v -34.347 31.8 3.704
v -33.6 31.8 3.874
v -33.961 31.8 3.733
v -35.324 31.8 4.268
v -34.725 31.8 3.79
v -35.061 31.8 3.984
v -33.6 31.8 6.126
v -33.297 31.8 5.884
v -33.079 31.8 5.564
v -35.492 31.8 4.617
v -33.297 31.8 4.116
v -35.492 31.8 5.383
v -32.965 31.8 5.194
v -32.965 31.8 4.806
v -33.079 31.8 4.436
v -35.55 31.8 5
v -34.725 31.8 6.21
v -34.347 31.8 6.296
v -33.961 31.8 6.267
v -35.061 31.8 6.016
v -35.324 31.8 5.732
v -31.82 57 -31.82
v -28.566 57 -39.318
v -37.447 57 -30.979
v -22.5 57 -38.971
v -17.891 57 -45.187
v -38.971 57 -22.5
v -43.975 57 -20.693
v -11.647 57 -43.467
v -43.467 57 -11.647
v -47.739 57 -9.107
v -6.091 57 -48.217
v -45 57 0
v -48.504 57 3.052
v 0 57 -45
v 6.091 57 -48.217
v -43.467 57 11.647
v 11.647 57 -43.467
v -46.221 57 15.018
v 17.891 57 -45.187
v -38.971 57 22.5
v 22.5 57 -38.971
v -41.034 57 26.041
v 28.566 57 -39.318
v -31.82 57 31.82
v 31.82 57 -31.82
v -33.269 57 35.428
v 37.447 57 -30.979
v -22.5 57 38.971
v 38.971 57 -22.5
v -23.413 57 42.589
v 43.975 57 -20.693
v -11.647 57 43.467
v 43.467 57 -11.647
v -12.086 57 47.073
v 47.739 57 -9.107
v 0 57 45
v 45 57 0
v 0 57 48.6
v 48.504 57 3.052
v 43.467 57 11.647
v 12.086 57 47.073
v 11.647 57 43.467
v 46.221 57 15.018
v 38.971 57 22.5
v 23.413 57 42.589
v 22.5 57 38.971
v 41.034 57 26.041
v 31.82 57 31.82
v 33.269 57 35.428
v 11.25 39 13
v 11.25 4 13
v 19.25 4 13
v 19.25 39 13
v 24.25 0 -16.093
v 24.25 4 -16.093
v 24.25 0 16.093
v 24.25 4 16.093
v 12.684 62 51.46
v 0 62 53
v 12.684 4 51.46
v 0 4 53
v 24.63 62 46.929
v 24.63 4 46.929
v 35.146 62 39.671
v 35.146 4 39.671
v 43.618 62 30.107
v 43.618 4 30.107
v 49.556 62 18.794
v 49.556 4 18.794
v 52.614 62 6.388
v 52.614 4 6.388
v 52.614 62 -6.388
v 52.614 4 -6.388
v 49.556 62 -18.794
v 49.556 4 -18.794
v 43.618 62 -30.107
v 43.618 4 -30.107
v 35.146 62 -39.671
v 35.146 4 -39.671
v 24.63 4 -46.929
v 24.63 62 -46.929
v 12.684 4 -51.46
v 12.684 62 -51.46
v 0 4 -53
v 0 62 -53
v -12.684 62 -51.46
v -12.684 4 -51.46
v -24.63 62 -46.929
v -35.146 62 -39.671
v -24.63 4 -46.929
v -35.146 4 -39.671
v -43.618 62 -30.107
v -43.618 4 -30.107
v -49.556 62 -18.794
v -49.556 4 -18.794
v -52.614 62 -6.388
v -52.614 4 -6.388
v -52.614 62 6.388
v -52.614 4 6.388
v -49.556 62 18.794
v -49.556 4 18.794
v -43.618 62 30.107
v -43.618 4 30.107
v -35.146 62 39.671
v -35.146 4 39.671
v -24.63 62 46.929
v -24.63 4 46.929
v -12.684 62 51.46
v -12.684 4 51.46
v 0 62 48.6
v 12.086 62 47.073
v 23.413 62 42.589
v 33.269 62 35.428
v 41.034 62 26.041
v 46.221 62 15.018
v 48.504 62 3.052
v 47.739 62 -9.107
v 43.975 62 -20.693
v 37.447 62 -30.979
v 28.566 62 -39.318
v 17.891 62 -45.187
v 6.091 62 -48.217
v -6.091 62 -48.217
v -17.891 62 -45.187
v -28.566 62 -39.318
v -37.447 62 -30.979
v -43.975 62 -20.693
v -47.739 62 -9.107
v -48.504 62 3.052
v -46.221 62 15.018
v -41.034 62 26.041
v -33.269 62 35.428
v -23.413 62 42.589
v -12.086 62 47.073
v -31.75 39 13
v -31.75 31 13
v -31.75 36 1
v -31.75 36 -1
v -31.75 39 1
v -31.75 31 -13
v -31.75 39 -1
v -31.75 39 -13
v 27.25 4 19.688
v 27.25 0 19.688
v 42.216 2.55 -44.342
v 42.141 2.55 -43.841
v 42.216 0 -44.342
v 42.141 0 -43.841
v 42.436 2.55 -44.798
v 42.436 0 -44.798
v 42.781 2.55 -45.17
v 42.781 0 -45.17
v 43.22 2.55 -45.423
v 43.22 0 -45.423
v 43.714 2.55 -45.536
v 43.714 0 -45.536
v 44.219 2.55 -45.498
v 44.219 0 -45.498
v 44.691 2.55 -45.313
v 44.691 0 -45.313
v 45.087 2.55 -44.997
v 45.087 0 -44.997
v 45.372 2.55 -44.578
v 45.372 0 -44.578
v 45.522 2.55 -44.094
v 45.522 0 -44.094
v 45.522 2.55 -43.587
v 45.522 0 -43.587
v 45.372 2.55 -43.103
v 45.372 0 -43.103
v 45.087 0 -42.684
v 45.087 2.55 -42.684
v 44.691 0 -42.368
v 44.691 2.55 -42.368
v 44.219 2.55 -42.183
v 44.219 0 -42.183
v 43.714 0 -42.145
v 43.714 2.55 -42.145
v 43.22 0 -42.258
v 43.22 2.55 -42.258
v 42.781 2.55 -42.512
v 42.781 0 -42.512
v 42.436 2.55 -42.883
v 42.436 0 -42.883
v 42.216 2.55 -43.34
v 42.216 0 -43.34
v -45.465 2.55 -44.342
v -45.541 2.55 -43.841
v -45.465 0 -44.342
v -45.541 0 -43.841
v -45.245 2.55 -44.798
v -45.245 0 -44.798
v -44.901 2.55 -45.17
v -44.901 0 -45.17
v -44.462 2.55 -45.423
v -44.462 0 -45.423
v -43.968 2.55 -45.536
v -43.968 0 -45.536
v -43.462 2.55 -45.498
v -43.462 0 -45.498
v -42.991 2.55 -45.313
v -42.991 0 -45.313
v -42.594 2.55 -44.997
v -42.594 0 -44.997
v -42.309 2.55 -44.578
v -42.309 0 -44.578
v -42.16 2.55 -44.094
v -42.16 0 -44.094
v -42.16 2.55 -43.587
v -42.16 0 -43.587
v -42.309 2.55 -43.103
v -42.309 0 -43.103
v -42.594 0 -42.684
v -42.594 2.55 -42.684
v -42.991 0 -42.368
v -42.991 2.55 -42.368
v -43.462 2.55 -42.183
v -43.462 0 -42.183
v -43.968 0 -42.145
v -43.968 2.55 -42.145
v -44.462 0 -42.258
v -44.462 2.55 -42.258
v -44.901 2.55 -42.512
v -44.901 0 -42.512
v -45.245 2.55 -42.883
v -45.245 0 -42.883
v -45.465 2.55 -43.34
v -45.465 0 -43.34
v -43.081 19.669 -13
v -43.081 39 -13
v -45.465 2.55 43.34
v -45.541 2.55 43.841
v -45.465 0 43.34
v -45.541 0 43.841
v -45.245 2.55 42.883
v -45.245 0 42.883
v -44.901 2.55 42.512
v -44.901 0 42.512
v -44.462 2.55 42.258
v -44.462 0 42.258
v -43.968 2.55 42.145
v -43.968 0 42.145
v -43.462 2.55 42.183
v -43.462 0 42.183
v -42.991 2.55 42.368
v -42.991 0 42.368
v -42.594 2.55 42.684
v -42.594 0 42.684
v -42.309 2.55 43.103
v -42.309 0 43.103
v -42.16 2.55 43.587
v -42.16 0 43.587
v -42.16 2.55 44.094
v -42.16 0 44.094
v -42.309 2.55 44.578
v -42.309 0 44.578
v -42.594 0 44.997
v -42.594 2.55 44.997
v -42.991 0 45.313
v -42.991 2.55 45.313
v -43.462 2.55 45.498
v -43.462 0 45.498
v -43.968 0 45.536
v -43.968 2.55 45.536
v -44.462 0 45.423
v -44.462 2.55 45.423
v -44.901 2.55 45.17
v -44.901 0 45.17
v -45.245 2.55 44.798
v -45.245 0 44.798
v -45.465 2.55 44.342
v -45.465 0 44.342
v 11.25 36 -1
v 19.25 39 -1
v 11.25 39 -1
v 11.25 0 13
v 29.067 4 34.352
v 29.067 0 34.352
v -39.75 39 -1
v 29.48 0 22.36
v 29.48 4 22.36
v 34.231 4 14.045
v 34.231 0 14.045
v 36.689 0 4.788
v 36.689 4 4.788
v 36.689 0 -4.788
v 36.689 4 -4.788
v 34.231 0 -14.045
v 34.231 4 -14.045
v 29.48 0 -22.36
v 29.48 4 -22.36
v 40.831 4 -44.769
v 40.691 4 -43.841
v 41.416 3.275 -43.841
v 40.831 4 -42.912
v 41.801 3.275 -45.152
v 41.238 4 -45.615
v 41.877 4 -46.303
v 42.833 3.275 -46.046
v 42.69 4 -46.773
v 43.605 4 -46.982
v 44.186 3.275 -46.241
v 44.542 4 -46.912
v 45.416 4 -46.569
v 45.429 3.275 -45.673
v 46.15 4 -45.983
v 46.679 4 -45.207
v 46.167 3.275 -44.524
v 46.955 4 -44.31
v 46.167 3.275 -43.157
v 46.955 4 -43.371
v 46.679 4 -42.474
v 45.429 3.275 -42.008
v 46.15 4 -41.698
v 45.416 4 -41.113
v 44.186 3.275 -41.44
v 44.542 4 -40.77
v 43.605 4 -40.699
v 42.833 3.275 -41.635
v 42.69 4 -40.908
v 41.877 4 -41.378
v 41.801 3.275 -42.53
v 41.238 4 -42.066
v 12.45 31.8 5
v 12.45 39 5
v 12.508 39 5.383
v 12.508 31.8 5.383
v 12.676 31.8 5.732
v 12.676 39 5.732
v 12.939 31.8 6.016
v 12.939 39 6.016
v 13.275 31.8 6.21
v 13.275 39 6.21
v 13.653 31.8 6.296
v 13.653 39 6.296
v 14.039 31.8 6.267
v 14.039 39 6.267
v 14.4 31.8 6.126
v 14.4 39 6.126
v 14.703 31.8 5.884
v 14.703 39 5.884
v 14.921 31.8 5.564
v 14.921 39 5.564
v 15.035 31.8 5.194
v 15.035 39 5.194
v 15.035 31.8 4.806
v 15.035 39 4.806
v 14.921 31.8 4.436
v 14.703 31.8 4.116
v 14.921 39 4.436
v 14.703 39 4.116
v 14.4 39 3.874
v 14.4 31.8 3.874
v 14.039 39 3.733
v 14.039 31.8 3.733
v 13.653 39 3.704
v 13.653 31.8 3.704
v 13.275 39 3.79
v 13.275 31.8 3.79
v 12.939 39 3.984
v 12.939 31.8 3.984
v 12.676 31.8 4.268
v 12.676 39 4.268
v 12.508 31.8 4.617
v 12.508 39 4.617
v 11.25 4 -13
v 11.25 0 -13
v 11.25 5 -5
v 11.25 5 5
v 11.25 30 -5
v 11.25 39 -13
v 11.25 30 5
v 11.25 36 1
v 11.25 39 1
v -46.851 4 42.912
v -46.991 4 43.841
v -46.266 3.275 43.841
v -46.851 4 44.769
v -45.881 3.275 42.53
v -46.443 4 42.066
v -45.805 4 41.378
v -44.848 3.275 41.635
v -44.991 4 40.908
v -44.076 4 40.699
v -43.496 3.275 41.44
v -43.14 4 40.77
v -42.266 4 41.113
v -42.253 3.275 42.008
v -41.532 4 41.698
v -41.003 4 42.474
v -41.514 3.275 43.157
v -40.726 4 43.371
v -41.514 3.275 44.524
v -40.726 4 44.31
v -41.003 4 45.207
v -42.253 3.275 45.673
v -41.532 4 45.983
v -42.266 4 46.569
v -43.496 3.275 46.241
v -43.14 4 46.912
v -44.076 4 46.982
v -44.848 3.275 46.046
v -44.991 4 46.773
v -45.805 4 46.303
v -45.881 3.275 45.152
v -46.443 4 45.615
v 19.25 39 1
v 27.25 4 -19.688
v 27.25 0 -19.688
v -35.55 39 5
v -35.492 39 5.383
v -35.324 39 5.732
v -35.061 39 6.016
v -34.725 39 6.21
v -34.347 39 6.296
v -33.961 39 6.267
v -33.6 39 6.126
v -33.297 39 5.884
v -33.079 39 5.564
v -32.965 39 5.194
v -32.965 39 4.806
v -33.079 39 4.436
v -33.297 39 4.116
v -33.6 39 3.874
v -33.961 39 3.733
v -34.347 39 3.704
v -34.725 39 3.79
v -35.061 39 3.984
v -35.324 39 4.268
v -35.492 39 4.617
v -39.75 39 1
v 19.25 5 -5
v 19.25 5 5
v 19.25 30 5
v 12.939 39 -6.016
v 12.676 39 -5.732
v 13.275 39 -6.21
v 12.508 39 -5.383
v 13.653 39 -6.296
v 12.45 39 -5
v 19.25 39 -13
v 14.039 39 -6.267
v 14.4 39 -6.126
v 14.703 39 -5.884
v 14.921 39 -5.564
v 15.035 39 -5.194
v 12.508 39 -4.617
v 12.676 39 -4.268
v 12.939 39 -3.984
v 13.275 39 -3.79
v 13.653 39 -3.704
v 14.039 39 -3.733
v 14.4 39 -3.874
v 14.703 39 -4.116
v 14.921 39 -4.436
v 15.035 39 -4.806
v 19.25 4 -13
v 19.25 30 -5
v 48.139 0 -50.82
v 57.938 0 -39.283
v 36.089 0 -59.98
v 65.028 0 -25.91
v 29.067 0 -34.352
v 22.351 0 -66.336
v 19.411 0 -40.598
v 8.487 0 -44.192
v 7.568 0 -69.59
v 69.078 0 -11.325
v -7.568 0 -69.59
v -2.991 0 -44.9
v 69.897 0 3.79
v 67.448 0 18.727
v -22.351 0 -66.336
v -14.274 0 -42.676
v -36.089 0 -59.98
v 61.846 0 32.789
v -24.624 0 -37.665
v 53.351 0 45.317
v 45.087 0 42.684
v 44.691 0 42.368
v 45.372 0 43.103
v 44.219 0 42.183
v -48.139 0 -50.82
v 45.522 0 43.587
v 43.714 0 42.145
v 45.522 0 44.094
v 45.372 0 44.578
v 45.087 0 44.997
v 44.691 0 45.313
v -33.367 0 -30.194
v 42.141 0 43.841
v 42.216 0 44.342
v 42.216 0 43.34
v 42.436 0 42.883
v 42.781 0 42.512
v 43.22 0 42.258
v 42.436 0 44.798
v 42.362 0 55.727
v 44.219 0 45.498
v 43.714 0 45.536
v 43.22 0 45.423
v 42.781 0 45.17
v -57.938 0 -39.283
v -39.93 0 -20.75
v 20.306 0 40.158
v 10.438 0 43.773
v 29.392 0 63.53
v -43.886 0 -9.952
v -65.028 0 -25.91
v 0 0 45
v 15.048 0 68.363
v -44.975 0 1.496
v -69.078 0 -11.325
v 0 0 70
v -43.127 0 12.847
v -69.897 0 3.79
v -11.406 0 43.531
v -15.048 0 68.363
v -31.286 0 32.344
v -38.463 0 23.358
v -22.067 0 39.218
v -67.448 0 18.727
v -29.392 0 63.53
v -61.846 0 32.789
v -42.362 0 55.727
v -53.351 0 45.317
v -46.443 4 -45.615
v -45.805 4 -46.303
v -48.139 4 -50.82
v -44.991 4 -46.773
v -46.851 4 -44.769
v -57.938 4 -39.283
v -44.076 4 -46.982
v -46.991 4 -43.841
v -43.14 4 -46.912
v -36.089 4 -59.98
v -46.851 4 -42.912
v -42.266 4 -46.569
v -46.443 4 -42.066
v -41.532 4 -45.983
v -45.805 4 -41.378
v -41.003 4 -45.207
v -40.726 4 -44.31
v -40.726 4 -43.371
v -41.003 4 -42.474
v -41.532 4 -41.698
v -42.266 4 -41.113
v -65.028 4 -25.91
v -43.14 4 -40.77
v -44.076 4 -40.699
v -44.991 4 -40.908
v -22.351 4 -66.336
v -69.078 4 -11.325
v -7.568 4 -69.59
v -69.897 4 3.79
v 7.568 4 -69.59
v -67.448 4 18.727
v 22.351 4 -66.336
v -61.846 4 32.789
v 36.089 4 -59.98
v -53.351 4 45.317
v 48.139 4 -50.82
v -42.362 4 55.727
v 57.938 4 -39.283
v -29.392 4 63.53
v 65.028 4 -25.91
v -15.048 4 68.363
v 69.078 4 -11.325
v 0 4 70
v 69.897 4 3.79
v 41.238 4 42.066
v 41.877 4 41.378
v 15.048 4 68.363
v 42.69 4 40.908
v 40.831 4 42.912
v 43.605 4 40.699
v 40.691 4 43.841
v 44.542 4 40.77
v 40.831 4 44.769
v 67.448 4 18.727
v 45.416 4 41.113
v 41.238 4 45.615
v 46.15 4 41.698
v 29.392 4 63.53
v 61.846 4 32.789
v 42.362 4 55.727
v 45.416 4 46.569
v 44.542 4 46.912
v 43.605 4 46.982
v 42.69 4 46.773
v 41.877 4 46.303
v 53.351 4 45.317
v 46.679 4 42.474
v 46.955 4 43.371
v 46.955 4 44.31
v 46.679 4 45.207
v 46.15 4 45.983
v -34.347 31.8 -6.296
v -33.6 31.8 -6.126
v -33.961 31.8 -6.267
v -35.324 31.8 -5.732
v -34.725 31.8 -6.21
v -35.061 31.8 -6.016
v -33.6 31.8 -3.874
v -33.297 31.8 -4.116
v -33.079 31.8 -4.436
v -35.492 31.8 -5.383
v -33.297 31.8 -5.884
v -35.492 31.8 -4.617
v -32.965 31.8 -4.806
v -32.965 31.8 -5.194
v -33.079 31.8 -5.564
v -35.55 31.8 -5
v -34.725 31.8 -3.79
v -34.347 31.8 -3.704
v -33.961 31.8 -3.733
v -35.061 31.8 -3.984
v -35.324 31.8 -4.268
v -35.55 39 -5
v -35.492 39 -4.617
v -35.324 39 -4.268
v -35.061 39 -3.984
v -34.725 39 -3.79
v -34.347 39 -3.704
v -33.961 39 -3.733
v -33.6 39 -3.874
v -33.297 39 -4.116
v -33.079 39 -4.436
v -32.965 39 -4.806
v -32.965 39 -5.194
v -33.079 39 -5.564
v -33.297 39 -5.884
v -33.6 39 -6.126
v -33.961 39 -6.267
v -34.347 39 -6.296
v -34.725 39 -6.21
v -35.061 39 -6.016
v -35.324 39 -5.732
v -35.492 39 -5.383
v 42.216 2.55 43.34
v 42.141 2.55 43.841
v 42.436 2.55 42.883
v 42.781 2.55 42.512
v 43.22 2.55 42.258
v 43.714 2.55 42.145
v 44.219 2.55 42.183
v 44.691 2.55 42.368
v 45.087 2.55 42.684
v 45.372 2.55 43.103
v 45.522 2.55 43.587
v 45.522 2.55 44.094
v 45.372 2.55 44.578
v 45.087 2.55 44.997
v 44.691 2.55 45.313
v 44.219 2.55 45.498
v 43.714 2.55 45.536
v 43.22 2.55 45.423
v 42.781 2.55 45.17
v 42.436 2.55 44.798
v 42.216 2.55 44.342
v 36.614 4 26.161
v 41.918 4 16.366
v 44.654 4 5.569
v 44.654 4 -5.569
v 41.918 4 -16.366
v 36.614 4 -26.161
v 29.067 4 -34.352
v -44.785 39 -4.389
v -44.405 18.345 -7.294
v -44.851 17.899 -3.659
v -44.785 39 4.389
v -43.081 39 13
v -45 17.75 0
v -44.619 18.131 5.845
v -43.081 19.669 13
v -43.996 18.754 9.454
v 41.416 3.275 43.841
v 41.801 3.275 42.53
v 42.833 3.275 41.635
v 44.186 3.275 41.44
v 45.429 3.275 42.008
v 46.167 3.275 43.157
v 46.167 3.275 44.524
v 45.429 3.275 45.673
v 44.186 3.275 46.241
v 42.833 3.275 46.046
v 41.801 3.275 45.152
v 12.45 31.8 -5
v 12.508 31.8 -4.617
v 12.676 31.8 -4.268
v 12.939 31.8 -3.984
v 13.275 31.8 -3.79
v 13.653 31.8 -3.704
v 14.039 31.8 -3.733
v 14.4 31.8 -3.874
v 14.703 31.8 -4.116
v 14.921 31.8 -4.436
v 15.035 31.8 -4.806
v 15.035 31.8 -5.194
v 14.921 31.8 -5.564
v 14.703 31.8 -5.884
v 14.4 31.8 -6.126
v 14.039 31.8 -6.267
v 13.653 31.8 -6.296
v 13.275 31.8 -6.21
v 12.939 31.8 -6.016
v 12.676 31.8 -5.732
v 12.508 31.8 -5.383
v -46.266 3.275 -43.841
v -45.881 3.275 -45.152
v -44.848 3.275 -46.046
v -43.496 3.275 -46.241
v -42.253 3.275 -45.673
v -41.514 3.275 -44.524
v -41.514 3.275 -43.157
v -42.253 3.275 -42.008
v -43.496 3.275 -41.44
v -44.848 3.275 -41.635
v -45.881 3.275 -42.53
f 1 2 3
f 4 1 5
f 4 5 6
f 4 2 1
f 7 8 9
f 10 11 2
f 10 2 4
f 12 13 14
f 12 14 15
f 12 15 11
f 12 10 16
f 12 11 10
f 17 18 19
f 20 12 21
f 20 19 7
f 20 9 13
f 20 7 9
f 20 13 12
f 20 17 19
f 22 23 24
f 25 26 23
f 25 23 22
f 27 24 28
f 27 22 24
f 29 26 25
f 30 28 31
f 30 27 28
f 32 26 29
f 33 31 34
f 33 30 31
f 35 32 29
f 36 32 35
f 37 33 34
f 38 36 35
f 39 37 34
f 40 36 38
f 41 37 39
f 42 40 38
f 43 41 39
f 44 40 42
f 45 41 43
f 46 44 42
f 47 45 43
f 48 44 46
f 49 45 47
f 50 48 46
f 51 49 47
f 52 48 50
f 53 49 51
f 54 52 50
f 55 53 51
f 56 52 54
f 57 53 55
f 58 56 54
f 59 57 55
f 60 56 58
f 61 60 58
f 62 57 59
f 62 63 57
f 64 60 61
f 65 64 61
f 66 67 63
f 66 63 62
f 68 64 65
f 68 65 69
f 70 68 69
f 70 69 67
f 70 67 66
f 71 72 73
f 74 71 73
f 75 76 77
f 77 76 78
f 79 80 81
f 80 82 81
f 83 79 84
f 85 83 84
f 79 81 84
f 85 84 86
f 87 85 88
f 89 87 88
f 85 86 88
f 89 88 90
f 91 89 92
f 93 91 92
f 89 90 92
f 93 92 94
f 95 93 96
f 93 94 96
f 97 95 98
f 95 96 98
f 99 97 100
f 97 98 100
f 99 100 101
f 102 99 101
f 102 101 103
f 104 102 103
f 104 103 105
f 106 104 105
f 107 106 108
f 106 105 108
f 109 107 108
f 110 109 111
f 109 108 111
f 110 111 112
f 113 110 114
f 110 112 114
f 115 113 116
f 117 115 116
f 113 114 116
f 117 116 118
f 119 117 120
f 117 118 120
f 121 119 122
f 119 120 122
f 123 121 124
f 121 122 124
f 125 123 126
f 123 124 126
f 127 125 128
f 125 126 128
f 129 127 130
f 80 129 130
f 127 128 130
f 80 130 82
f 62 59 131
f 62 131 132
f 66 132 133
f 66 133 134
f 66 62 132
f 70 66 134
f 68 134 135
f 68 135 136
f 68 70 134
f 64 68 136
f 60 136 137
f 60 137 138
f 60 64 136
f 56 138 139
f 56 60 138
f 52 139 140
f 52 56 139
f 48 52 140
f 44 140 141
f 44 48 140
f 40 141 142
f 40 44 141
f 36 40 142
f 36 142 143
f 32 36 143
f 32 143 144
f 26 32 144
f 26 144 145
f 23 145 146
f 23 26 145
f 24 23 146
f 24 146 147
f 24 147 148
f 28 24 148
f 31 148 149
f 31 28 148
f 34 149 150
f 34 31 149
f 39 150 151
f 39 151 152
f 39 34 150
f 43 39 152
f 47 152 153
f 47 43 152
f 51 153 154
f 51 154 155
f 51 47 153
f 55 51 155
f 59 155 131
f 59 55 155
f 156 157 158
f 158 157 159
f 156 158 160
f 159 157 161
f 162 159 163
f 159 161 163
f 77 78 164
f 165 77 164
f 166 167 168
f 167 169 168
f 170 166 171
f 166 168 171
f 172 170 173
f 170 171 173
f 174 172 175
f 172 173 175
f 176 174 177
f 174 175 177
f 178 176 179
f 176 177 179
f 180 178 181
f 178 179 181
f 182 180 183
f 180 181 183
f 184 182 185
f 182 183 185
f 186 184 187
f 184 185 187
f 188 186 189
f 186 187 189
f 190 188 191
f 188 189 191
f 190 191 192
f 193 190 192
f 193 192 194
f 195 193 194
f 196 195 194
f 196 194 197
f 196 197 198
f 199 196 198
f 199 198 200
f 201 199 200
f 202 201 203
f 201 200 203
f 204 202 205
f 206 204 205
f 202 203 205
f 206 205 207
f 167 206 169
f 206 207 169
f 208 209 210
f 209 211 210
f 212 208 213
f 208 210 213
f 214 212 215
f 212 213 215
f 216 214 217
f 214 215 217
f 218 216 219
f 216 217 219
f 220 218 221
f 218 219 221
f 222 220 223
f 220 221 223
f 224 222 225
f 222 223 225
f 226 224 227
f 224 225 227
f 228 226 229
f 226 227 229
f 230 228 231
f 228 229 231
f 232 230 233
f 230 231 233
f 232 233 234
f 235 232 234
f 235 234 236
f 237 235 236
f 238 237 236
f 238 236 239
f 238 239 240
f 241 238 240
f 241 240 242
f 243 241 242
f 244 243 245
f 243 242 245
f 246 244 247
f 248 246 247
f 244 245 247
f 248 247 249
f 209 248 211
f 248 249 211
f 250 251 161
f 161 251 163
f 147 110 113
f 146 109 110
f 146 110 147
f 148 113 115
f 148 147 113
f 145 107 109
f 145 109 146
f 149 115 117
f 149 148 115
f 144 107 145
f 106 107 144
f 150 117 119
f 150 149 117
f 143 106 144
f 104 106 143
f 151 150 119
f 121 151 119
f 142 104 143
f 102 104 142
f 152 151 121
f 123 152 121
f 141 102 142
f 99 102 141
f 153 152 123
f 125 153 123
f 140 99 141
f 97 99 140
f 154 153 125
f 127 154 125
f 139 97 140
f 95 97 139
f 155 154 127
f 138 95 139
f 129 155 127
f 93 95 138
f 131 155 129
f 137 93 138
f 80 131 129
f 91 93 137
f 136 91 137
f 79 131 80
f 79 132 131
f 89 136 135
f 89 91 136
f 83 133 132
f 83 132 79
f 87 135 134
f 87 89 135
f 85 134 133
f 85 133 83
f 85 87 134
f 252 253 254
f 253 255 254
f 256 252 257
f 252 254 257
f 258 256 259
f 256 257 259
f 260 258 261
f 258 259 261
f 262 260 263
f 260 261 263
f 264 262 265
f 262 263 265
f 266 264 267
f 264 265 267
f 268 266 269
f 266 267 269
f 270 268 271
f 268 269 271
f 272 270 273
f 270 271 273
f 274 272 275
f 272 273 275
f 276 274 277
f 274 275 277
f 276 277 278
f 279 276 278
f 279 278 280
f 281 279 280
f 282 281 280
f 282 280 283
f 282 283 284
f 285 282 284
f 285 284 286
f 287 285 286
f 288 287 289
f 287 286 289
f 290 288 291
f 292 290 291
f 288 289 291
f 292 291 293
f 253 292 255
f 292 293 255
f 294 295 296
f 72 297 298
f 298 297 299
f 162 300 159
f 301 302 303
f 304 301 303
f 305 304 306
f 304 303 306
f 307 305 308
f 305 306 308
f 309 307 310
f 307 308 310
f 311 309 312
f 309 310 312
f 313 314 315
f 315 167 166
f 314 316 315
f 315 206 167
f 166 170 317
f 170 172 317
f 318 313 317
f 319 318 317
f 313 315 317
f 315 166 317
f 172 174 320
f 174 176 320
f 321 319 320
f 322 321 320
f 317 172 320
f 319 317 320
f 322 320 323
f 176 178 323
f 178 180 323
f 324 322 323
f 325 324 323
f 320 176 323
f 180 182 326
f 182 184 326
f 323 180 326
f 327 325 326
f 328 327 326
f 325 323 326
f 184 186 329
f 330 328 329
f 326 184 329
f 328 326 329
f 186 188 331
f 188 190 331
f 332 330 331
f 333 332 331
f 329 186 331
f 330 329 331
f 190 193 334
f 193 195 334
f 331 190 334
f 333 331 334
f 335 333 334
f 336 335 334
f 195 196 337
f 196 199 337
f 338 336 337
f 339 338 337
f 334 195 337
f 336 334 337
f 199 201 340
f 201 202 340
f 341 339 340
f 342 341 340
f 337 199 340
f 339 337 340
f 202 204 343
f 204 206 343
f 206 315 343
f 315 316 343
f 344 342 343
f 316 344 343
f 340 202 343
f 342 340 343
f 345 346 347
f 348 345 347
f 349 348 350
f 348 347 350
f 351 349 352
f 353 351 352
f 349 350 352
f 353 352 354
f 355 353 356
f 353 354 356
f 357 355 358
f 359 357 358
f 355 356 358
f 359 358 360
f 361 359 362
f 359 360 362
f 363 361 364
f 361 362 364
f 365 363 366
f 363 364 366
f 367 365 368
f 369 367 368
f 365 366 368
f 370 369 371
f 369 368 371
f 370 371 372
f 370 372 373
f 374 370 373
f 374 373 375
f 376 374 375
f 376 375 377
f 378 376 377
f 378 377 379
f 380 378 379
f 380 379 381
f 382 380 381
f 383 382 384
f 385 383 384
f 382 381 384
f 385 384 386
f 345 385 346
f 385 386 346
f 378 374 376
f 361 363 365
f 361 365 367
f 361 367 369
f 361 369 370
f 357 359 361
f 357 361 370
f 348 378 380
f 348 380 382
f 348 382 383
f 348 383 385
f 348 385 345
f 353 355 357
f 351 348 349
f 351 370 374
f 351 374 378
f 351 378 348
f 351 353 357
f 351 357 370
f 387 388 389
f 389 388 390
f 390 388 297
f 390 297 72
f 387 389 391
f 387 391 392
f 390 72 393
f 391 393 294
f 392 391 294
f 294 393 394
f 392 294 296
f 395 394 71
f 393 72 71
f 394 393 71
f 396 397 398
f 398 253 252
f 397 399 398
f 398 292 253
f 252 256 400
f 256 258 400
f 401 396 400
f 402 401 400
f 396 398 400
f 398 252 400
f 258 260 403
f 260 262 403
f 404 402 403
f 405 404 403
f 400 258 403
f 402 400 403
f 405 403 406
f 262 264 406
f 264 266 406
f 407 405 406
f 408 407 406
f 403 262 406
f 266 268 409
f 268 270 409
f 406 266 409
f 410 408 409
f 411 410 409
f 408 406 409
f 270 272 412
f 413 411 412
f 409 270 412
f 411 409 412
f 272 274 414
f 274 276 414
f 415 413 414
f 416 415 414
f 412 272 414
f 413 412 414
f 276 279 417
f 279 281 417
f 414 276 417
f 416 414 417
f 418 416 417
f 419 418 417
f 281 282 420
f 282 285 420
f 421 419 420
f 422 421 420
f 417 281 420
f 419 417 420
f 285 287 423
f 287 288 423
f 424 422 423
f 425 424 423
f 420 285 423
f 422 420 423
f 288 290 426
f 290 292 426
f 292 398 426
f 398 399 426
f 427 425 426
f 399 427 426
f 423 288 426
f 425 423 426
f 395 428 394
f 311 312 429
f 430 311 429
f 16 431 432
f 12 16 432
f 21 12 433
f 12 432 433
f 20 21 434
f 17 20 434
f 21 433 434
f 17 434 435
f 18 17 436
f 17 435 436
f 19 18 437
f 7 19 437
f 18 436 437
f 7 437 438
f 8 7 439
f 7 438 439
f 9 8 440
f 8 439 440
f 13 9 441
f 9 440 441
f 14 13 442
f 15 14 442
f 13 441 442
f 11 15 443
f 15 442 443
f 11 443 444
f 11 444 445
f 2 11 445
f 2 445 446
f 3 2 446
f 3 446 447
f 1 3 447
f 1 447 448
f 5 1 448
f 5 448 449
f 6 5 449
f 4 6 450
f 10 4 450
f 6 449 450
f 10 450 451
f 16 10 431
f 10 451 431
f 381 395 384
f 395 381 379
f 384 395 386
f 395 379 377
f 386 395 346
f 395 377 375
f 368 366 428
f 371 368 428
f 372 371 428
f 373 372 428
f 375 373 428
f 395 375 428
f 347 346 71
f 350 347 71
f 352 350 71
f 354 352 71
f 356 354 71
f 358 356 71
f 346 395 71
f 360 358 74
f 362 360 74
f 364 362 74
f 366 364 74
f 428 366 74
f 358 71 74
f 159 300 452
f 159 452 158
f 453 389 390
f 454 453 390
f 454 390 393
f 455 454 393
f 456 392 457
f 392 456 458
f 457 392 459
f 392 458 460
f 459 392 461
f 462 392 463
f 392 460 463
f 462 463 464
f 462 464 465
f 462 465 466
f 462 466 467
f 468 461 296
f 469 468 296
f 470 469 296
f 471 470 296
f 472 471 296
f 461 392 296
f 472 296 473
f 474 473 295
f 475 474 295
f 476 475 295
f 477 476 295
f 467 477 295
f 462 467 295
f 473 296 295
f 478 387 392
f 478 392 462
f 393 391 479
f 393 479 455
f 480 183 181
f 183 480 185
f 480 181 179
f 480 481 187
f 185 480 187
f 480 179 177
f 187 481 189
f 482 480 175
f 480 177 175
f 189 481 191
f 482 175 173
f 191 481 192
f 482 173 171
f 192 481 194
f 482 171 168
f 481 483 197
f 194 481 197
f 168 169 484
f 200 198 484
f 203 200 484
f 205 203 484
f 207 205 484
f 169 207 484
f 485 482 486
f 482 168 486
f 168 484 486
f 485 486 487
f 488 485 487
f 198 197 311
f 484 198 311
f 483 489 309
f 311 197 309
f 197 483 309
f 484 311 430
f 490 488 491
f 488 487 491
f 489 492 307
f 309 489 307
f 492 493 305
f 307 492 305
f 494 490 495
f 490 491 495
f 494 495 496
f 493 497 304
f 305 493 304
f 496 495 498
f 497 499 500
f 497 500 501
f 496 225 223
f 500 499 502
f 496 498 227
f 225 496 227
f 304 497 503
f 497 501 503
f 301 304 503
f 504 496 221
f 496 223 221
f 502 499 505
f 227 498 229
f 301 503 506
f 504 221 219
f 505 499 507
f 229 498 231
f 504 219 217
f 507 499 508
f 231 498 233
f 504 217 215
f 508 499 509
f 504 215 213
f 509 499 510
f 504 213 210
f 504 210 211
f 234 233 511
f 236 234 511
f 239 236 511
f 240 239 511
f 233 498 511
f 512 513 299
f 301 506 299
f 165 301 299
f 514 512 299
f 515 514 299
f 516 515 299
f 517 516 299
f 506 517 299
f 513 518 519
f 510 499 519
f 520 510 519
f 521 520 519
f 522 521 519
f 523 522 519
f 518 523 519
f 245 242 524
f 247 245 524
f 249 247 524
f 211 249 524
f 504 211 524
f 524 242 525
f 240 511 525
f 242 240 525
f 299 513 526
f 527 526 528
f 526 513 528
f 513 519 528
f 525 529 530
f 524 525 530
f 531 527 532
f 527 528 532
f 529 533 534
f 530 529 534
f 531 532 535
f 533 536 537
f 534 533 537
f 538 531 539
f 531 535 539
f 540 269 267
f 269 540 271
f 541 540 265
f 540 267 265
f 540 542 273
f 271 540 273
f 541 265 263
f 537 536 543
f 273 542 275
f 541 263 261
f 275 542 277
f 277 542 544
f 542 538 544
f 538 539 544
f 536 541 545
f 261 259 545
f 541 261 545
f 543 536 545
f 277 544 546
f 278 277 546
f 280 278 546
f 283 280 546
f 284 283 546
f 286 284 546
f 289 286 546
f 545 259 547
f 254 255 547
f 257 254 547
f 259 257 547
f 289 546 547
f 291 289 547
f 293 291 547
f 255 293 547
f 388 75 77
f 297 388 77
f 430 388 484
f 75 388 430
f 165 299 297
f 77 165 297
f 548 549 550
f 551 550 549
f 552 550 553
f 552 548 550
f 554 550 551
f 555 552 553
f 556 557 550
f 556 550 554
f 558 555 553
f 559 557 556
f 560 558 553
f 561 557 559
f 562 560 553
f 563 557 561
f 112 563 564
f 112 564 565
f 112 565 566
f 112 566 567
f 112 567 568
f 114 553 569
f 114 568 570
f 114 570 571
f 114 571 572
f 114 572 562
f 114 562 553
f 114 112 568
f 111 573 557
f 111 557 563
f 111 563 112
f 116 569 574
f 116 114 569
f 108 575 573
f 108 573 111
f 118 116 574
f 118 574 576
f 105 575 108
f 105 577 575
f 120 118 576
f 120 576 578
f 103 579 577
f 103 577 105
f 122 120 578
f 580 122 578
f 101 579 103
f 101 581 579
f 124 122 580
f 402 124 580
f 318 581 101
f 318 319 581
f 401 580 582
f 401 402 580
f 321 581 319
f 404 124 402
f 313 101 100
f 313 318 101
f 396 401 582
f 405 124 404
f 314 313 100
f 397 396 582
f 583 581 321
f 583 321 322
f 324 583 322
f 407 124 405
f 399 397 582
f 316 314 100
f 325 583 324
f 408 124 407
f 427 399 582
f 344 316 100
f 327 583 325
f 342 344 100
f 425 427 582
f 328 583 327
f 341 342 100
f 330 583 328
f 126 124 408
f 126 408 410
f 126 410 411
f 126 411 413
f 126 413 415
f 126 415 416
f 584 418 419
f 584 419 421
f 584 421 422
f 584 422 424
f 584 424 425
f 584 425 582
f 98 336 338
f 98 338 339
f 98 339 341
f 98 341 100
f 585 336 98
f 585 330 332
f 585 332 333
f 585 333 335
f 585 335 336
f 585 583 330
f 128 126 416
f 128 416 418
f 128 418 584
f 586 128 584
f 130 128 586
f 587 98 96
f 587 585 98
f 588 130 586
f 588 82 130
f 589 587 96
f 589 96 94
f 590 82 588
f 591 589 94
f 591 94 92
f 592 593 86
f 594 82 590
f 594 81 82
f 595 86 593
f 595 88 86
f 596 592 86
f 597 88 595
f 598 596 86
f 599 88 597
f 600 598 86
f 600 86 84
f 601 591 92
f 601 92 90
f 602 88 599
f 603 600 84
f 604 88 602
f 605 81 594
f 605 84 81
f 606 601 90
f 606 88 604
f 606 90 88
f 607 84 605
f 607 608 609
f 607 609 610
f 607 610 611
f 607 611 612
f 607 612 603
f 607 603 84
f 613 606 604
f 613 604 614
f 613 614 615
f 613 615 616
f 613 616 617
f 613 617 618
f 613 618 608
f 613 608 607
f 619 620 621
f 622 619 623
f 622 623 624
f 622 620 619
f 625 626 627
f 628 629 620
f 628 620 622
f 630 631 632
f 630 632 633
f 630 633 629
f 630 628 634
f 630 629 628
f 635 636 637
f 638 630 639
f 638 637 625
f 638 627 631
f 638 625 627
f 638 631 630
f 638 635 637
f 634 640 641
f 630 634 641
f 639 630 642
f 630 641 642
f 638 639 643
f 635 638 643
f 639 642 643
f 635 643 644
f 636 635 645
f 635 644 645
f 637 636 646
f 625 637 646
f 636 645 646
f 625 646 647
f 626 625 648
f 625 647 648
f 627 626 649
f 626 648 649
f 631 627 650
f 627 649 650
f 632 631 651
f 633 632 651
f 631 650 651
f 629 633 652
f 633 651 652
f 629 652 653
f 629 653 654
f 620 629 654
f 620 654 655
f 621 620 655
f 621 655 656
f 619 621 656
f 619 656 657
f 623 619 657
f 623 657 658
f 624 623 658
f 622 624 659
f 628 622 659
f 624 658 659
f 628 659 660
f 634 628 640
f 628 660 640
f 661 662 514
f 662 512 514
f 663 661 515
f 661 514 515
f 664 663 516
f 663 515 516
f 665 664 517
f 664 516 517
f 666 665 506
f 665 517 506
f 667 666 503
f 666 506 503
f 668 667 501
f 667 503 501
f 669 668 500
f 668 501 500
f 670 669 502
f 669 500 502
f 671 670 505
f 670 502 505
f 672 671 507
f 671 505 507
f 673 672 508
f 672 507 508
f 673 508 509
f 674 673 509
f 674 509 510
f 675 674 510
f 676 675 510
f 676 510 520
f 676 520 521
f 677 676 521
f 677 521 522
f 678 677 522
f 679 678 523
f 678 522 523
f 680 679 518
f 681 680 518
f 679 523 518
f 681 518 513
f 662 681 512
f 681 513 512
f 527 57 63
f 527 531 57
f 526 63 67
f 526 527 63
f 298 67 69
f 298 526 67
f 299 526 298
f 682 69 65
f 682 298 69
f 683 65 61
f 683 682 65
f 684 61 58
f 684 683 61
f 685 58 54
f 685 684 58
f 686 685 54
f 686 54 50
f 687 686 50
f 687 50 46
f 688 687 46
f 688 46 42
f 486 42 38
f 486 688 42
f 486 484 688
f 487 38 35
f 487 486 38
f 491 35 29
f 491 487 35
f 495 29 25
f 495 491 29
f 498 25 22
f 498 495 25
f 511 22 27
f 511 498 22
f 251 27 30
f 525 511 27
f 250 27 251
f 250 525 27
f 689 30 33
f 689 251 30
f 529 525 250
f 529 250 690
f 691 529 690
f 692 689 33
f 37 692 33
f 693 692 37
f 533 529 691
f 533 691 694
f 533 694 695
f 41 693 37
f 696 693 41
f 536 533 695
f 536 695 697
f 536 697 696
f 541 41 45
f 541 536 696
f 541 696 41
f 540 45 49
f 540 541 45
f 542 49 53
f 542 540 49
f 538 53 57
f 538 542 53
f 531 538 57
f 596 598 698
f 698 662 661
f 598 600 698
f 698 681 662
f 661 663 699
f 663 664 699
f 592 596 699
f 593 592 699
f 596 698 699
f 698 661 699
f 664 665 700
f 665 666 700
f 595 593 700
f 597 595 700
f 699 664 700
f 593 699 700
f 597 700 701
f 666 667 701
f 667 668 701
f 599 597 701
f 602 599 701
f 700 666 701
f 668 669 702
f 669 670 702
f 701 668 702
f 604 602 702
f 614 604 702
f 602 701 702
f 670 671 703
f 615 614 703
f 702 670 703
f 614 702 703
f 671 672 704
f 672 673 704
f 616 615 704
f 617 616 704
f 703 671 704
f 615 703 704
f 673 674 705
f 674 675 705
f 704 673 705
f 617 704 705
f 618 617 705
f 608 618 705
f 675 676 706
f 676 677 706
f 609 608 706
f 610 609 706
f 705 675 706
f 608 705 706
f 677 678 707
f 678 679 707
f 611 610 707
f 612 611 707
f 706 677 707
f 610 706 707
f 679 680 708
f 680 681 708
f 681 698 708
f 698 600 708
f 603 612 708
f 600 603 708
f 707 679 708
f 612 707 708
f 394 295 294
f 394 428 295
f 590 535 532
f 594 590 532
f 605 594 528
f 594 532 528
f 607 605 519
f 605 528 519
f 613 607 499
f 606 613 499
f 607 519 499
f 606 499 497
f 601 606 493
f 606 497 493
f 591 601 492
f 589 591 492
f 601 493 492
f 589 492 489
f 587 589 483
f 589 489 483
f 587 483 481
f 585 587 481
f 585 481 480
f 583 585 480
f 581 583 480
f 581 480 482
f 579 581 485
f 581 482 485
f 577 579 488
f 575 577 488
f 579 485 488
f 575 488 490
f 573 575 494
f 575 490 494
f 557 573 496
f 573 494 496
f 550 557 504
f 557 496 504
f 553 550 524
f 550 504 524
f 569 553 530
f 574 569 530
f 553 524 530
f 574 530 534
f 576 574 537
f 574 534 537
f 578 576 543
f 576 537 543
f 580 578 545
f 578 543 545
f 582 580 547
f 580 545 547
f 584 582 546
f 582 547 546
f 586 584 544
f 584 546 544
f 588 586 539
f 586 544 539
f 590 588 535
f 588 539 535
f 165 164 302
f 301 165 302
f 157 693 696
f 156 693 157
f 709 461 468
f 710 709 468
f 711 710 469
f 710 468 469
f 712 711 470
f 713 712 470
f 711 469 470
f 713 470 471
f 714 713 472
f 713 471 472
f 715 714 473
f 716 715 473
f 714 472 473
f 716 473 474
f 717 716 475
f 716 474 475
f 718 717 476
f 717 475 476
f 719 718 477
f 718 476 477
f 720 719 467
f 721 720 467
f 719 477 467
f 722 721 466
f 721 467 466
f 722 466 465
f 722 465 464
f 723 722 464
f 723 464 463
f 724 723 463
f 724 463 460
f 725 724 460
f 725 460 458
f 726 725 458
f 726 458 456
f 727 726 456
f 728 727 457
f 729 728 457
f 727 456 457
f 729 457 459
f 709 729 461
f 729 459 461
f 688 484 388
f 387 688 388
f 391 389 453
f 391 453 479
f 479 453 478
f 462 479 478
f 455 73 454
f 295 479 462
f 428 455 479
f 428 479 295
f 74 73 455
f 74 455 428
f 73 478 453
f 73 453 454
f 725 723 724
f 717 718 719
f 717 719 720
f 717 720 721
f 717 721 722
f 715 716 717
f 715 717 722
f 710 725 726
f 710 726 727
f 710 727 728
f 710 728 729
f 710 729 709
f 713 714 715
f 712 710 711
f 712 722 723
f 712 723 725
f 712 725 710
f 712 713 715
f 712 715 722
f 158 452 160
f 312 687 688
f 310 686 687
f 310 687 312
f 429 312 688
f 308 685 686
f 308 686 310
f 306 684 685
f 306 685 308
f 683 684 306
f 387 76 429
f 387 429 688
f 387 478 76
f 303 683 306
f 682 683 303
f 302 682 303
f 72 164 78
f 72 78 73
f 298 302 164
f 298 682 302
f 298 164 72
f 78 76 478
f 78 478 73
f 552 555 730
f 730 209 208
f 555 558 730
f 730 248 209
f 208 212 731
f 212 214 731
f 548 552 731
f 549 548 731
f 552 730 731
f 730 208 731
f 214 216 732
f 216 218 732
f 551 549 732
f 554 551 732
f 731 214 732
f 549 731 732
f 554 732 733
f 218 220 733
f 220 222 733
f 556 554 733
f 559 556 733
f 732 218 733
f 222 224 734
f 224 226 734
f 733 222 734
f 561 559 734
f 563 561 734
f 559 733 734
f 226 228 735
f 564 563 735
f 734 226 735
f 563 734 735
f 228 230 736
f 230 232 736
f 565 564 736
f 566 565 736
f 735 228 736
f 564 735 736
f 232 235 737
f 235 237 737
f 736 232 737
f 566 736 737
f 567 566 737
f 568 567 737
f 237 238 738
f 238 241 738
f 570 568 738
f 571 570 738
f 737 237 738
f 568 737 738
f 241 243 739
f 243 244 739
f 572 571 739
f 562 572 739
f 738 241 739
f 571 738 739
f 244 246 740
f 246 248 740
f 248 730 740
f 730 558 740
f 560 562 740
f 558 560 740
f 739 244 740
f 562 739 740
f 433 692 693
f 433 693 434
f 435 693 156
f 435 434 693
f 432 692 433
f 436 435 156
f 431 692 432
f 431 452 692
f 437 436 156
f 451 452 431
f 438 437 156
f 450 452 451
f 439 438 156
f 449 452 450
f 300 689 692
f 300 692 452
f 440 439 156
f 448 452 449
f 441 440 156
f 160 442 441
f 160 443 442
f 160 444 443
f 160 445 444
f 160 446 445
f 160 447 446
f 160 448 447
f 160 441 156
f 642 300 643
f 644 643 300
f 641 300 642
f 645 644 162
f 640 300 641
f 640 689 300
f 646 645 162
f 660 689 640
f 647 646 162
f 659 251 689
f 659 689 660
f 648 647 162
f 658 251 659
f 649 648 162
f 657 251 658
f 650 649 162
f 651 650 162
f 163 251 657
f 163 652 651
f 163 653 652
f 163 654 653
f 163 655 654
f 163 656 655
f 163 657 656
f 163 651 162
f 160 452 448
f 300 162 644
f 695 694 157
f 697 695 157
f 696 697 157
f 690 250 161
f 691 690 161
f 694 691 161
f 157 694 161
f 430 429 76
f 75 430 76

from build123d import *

# Parameters (mm, degrees)
SKETCH1_R                                           = 70
SKETCH1_R_2                                         = 45
BOSS_EXTRUDE1_DEPTH                                 = 4
SKETCH2_R                                           = 53
SKETCH2_R_2                                         = 45
BOSS_EXTRUDE2_DEPTH                                 = 53
SKETCH4_W                                           = 13.25
SKETCH4_H                                           = 8
SKETCH4_W_2                                         = 8
SKETCH4_H_2                                         = 39
BOSS_EXTRUDE4_DEPTH                                 = 13
BOSS_EXTRUDE5_DEPTH                                 = 4
SKETCH7_R                                           = 1.3
CUT_EXTRUDE4_DEPTH                                  = 7.2
SKETCH9_W                                           = 10
SKETCH9_H                                           = 25
CUT_EXTRUDE7_DEPTH                                  = 8
CUT_EXTRUDE9_DEPTH                                  = 113.289803633
CSK_FOR_M3_COUNTERSUNK_FLAT_HEAD_SCREW1_D           = 3.4
CSK_FOR_M3_COUNTERSUNK_FLAT_HEAD_SCREW1_CSINK_D     = 6.3
CSK_FOR_M3_COUNTERSUNK_FLAT_HEAD_SCREW1_CSINK_ANGLE = 90
SKETCH18_R                                          = 53
SKETCH18_R_2                                        = 48.6
BOSS_EXTRUDE6_DEPTH                                 = 5
CUT_EXTRUDE10_DEPTH                                 = 1


with BuildPart() as part:
    # Sketch1 → Boss-Extrude1 (new body)
    with BuildSketch(Plane(origin=(0, 0, 0), x_dir=(1, 0, 0), z_dir=(0, 1, 0))):
        with Locations(Location((0, 0, 0), (0, 0, 270))):
            Circle(SKETCH1_R)
        with Locations(Location((0, 0, 0), (0, 0, 270))):
            Circle(SKETCH1_R_2, mode=Mode.SUBTRACT)
    extrude(amount=BOSS_EXTRUDE1_DEPTH)

    # Sketch2 → Boss-Extrude2 (add)
    with BuildSketch(Plane(origin=(0, 4, 0), x_dir=(1, 0, 0), z_dir=(0, 1, 0))):
        with Locations(Location((0, 0, 0), (0, 0, 270))):
            Circle(SKETCH2_R)
        with Locations(Location((0, 0, 0), (0, 0, 270))):
            Circle(SKETCH2_R_2, mode=Mode.SUBTRACT)
    extrude(amount=BOSS_EXTRUDE2_DEPTH)

    # Sketch4 → Boss-Extrude4 (add, symmetric)
    with BuildSketch(Plane.XY):
        with Locations((-38.375, 35)):
            Rectangle(SKETCH4_W, SKETCH4_H)
        Polygon((-31.75, 31), (-45, 31), (-45, 17.75), align=None)
        with Locations((15.25, 19.5)):
            Rectangle(SKETCH4_W_2, SKETCH4_H_2)
    extrude(amount=BOSS_EXTRUDE4_DEPTH, both=True)


with BuildPart() as boss_extrude4_piece_1:
    # of the separate pieces the step leaves, piece 1, a body of its own (boss_extrude4_pieces)
    add(part.part.solids().sort_by_distance((0, 0, 70))[0])



with BuildPart() as boss_extrude4_piece_2:
    # of the separate pieces the step leaves, piece 2, a body of its own (boss_extrude4_pieces)
    add(part.part.solids().sort_by_distance((11.25, 39, -13))[0])


with BuildPart() as boss_extrude4_piece_1_1:
    add(boss_extrude4_piece_1.part)

    add(boss_extrude4_piece_2.part)  # Boss-Extrude5 merges Boss-Extrude4 piece 2
    # Sketch5 → Boss-Extrude5 (add)
    with BuildSketch(Plane.XZ):
        with BuildLine():
            Line((11.25, 13), (29.067400866, 34.352382842))
            ThreePointArc((29.067400866, 34.352382842), (45, 0), (29.067400866, -34.352382842))
            Line((29.067400866, -34.352382842), (11.25, -13))
            Line((11.25, -13), (11.25, 13))
        make_face()
    extrude(amount=-BOSS_EXTRUDE5_DEPTH)

    # Sketch7 → Cut-Extrude4 (cut)
    with BuildSketch(Plane(origin=(0, 39, 0), x_dir=(1, 0, 0), z_dir=(0, 1, 0))):
        with Locations(Location((-34.25, 5, 0), (0, 0, 180))):
            Circle(SKETCH7_R)
        with Locations(Location((-34.25, -5, 0), (0, 0, 180))):
            Circle(SKETCH7_R)
        with Locations(Location((13.75, 5, 0), (0, 0, 180))):
            Circle(SKETCH7_R)
        with Locations(Location((13.75, -5, 0), (0, 0, 180))):
            Circle(SKETCH7_R)
    extrude(amount=-CUT_EXTRUDE4_DEPTH, mode=Mode.SUBTRACT)

    # Sketch9 → Cut-Extrude7 (cut)
    with BuildSketch(Plane.ZY.offset(-11.25)):
        with Locations((0, 17.5)):
            Rectangle(SKETCH9_W, SKETCH9_H)
    extrude(amount=-CUT_EXTRUDE7_DEPTH, mode=Mode.SUBTRACT)

    # Sketch12 → Cut-Extrude9 (cut, through all)
    with BuildSketch(Plane(origin=(0, 4, 0), x_dir=(1, 0, 0), z_dir=(0, 1, 0))):
        with BuildLine():
            Line((29.479537487, 22.359715328), (27.25, 19.687836398))
            Line((27.25, 19.687836398), (27.25, -19.687836398))
            Line((27.25, -19.687836398), (29.479537487, -22.359715328))
            ThreePointArc((29.479537487, -22.359715328), (37, 0), (29.479537487, 22.359715328))
        make_face()
        Polygon((27.25, -19.687836398), (27.25, 19.687836398), (24.25, 16.092634774), (24.25, -16.092634774), align=None)
    extrude(amount=-CUT_EXTRUDE9_DEPTH, mode=Mode.SUBTRACT)

    # CSK for M3 Countersunk Flat Head Screw1 (through all)
    with Locations(Plane(origin=(0, 4, 0), x_dir=(1, 0, 0), z_dir=(0, 1, 0))):
        with Locations((-43.840620434, 43.840620434), (-43.840620434, -43.840620434), (43.840620434, -43.840620434), (43.840620434, 43.840620434)):
            CounterSinkHole(CSK_FOR_M3_COUNTERSUNK_FLAT_HEAD_SCREW1_D / 2, CSK_FOR_M3_COUNTERSUNK_FLAT_HEAD_SCREW1_CSINK_D / 2, counter_sink_angle=CSK_FOR_M3_COUNTERSUNK_FLAT_HEAD_SCREW1_CSINK_ANGLE)

    # Sketch18 → Boss-Extrude6 (add)
    with BuildSketch(Plane(origin=(0, 57, 0), x_dir=(1, 0, 0), z_dir=(0, 1, 0))):
        with Locations(Location((0, 0, 0), (0, 0, 270))):
            Circle(SKETCH18_R)
        with Locations(Location((0, 0, 0), (0, 0, 270))):
            Circle(SKETCH18_R_2, mode=Mode.SUBTRACT)
    extrude(amount=BOSS_EXTRUDE6_DEPTH)

    # Sketch19 → Cut-Extrude10 (cut, symmetric)
    with BuildSketch(Plane.XY):
        Polygon((-39.75, 39), (-31.75, 36), (-31.75, 39), align=None)
        Polygon((11.25, 39), (19.25, 39), (11.25, 36), align=None)
    extrude(amount=CUT_EXTRUDE10_DEPTH, both=True, mode=Mode.SUBTRACT)


solid = boss_extrude4_piece_1_1.part
